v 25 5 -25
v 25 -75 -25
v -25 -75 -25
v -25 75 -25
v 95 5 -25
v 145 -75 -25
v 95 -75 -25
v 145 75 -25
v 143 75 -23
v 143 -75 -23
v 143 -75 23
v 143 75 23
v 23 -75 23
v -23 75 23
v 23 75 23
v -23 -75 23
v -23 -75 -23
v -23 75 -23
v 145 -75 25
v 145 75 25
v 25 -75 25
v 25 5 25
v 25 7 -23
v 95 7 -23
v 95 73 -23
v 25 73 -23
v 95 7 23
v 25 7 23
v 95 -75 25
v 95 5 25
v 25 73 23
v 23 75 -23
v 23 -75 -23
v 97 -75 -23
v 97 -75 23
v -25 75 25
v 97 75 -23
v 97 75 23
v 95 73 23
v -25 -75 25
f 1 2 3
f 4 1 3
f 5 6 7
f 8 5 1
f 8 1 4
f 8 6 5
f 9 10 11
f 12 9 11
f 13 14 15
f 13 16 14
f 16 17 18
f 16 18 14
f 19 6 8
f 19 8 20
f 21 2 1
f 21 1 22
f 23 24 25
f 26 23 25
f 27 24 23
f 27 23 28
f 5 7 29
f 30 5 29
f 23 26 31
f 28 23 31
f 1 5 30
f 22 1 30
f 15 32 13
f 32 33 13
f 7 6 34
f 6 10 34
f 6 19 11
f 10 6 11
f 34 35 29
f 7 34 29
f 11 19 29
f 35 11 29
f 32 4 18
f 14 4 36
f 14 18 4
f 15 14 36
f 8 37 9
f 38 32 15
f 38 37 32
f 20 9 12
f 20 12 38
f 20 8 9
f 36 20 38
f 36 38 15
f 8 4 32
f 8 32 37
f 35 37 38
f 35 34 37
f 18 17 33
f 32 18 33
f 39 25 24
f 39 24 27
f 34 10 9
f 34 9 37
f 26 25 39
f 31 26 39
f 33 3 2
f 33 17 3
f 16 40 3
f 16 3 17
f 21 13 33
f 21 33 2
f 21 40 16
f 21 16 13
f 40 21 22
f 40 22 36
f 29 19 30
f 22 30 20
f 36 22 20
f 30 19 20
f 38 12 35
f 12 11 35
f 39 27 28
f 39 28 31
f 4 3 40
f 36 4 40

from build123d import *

# Parameters (mm, degrees)
F0_W     = 50
F0_H     = 50
F0_W_2   = 46
F0_H_2   = 46
F1_DEPTH = 75
F2_W     = 70
F2_H     = 50
F2_W_2   = 66
F2_H_2   = 46
F3_DEPTH = 35


with BuildPart() as f1:
    # F0 (on Front) → F1 (new body, symmetric)
    with BuildSketch(Plane.XZ):
        Rectangle(F0_W, F0_H)
        Rectangle(F0_W_2, F0_H_2, mode=Mode.SUBTRACT)
    extrude(amount=F1_DEPTH, both=True)

    # F2 (on face) → F3 (join)
    with BuildSketch(Plane.YZ.offset(25)):
        with Locations((40, 0)):
            Rectangle(F2_W, F2_H)
        with Locations((40, 0)):
            Rectangle(F2_W_2, F2_H_2, mode=Mode.SUBTRACT)
    extrude(amount=F3_DEPTH)

    # F5: F1 across plane


with BuildPart() as f1_1:
    add(f1.part)
    add(f1.part.mirror(Plane(origin=(60, 40, 0), x_dir=(0, 1, 0), z_dir=(1, 0, 0))))


solid = f1_1.part
